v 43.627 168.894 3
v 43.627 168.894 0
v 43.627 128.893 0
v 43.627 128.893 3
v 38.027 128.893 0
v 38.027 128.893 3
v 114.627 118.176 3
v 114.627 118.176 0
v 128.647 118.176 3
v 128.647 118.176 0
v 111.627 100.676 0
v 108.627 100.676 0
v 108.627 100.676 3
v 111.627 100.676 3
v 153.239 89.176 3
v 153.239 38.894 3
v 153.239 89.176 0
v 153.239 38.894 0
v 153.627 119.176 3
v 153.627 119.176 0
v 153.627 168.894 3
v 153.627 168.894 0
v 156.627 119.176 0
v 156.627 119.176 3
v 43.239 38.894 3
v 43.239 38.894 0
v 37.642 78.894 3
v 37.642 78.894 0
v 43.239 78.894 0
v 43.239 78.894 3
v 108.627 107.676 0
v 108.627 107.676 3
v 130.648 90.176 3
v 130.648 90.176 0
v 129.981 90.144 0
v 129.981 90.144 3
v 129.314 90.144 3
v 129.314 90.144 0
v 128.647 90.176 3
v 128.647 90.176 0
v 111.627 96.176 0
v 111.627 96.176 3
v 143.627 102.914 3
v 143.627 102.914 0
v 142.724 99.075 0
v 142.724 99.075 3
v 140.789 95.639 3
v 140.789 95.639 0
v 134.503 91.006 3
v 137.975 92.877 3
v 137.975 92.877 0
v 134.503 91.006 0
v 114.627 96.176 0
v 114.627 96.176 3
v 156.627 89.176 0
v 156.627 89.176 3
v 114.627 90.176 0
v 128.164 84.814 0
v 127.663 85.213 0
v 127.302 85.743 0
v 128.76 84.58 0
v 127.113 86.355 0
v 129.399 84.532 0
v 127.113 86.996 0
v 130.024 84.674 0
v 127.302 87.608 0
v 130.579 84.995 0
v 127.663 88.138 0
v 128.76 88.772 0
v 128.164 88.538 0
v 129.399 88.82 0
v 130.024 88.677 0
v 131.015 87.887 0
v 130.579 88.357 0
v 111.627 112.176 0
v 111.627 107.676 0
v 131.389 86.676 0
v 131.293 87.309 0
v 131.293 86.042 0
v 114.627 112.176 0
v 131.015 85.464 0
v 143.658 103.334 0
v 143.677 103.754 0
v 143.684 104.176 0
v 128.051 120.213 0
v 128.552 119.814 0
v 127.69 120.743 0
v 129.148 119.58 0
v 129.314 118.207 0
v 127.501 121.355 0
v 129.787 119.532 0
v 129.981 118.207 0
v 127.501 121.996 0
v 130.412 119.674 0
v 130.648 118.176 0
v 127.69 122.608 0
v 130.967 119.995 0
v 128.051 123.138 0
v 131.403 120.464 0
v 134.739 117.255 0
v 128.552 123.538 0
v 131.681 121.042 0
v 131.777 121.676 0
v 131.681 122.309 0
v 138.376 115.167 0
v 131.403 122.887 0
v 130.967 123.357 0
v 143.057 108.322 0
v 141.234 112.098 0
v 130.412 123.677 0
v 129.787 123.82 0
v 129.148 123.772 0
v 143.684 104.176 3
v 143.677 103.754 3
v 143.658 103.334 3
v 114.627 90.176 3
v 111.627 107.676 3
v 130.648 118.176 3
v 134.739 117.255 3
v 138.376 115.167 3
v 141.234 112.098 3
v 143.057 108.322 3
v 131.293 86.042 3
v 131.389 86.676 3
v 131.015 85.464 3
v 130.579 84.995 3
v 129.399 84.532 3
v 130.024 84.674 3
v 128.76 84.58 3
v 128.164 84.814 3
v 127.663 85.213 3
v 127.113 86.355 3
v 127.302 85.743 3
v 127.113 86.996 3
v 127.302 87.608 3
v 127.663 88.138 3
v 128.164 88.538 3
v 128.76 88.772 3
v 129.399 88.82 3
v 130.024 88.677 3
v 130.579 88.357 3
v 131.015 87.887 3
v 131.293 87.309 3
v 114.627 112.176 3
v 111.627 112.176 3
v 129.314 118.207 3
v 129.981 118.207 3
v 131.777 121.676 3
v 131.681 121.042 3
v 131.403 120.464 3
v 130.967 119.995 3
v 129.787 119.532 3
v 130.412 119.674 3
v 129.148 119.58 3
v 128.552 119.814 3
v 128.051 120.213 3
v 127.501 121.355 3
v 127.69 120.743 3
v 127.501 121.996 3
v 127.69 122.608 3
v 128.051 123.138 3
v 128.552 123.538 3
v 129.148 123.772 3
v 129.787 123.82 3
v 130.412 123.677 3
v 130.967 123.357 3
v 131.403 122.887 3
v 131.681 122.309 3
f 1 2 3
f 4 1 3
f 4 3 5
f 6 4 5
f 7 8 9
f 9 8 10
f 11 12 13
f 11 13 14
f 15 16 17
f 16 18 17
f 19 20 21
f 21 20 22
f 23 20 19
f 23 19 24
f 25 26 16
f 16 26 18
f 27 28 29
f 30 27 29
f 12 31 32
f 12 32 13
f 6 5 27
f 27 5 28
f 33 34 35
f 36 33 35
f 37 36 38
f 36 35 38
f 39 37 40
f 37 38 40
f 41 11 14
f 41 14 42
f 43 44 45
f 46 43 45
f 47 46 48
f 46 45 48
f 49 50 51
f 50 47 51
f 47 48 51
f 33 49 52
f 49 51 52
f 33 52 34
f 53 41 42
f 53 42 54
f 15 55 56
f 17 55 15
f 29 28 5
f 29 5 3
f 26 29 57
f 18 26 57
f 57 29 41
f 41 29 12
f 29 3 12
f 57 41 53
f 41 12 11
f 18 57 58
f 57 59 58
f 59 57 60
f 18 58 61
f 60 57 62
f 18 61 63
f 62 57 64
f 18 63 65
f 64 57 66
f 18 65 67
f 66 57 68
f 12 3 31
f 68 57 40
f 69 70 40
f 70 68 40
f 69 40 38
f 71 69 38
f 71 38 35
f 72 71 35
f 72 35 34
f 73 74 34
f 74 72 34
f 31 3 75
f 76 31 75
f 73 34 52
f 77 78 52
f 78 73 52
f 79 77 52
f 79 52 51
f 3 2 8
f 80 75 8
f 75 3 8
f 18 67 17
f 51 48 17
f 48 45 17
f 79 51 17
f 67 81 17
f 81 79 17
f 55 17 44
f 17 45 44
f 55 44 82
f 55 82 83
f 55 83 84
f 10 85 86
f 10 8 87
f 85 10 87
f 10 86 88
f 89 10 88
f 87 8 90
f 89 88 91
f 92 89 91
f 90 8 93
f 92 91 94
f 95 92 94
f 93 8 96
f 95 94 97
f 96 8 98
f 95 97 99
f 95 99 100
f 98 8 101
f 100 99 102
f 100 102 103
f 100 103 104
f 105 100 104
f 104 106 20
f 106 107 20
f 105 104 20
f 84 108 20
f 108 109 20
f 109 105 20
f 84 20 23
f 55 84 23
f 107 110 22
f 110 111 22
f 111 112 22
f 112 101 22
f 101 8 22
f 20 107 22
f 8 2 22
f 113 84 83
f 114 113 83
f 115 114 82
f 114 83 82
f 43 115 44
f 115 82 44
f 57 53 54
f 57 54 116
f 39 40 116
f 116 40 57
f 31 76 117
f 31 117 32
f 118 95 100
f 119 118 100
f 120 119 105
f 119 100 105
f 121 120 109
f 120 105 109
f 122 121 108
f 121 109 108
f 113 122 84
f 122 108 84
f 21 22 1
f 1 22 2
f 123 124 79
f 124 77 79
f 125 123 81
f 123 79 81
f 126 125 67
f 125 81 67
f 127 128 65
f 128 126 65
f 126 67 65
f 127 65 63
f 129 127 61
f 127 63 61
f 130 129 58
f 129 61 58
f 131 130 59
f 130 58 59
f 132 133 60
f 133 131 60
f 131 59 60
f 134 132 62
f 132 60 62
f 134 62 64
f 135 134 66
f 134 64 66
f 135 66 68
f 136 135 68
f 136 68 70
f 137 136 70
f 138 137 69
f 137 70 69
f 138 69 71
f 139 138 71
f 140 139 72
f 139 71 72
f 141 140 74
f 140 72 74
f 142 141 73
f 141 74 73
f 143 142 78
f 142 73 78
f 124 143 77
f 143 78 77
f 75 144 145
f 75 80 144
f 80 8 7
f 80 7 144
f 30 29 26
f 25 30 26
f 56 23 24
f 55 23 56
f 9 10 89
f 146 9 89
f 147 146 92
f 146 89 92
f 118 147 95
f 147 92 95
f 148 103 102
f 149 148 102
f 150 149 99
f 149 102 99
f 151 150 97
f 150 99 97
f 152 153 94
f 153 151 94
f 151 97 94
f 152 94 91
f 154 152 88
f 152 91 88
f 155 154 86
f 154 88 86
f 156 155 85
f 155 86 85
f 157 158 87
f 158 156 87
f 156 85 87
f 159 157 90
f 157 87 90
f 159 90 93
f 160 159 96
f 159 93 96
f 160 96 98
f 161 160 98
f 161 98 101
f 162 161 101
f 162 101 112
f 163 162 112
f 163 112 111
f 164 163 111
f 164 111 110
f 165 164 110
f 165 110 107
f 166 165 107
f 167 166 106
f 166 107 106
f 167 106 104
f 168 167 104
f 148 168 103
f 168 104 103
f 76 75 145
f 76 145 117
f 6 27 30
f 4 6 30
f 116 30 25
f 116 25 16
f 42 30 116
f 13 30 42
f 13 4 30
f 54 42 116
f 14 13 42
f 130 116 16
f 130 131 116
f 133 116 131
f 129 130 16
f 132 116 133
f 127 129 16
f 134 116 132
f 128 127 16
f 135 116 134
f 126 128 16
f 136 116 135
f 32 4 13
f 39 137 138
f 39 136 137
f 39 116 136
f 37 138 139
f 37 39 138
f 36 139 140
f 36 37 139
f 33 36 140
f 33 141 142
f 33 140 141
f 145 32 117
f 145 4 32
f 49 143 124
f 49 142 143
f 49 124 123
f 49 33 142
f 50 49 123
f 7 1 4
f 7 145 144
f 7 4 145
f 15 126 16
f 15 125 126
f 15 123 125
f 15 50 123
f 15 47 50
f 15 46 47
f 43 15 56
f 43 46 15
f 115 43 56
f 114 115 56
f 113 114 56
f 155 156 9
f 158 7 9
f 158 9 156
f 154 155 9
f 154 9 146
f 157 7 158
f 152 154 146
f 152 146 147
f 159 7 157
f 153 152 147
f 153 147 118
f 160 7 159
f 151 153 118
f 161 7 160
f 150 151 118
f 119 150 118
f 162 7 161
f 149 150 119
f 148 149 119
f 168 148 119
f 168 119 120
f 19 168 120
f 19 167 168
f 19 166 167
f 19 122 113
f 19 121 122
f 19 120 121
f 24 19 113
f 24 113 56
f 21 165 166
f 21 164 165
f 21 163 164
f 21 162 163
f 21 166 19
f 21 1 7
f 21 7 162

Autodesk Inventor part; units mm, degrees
ref_plane "YZ Plane" through (0, 0, 0) normal (1, 0, 0) x (0, 1, 0)
ref_plane "XZ Plane" through (0, 0, 0) normal (0, 1, 0) x (-1, 0, 0)
ref_plane "XY Plane" through (0, 0, 0) normal (0, 0, 1) x (1, 0, 0)
sketch "Sketch2" plane through (0, 0, 0) normal (0, 0, 1) x (1, 0, 0)
  line L0 (130.6479, 118.1756) -> (130.6479, 90.1756)
  circle A0 centre (129.6479, 104.1756) radius 14.0357
  line L1 (39.8344, 104.1756) -> (88.8344, 104.1756)
  line L2 (130.6479, 90.1756) -> (114.6267, 90.1756)
  line L3 (114.6267, 118.1756) -> (130.6479, 118.1756)
  arc A1 (143.6267, 102.9137) -> (130.6479, 118.1756) centre (129.6479, 104.1756) ccw
  arc A2 (130.6479, 90.1756) -> (143.6267, 102.9137) centre (129.6479, 104.1756) ccw
  line L4 (130.6479, 90.1756) -> (114.6267, 90.1756)
  line L5 (114.6267, 118.1756) -> (130.6479, 118.1756)
  line L6 (153.6267, 168.8936) -> (43.6267, 168.8936)
  line L7 (43.6267, 168.8936) -> (43.6267, 128.8928)
  line L8 (43.6267, 128.8928) -> (38.0267, 128.8928)
  line L9 (38.0267, 128.8928) -> (37.642, 78.8943)
  line L10 (37.642, 78.8943) -> (43.2388, 78.8943)
  line L11 (43.2388, 78.8943) -> (43.2388, 38.8936)
  line L12 (43.2388, 38.8936) -> (153.2388, 38.8936)
  line L13 (153.2388, 38.8936) -> (153.2388, 89.1756)
  line L14 (153.6267, 119.1756) -> (153.6267, 168.8936)
  line L15 (114.6267, 118.1756) -> (114.6267, 112.1756)
  line L16 (114.6267, 112.1756) -> (111.6267, 112.1756)
  line L17 (111.6267, 112.1756) -> (111.6267, 107.6756)
  line L18 (111.6267, 107.6756) -> (108.6267, 107.6756)
  line L19 (108.6267, 107.6756) -> (108.6267, 100.6756)
  line L20 (108.6267, 100.6756) -> (111.6267, 100.6756)
  line L21 (111.6267, 100.6756) -> (111.6267, 96.1756)
  line L22 (111.6267, 96.1756) -> (114.6267, 96.1756)
  line L23 (114.6267, 96.1756) -> (114.6267, 90.1756)
  line L24 (153.6267, 119.1756) -> (156.6267, 119.1756)
  line L25 (156.6267, 119.1756) -> (156.6267, 89.1756)
  line L26 (156.6267, 89.1756) -> (153.2388, 89.1756)
  circle A3 centre (129.2388, 86.6756) radius 2.15
  circle A4 centre (129.6267, 121.6756) radius 2.15
  point P0 (0, 0)
  point P1 (128.6479, 118.1756)
  point P2 (128.6479, 90.1756)
  point P3 (122.6373, 90.1756)
  point P4 (122.6373, 118.1756)
  dimension "d0" = 50
  dimension "d1" = 130
  dimension "d2" = 28.0713
  dimension "d3" = 7
  dimension "d4" = 3
  dimension "d5" = 6
  dimension "d6" = 6
  dimension "d7" = 110
  dimension "d8" = 110
  dimension "d9" = 5.6
  dimension "d10" = 3
  dimension "d11" = 32
  dimension "d13" = 10
  dimension "d14" = 30
  dimension "d15" = 3
  dimension "d18" = 28
  dimension "d28" = 4.3
  dimension "d29" = 24
  dimension "d30" = 3.5
  dimension "d31" = 4.3
  dimension "d32" = 24
  dimension "d33" = 3.5
ref_plane "Work Plane1" through (0, 0, 3) normal (0, 0, 1) x (1, 0, 0)
sketch "Sketch3" plane through (0, 0, 3) normal (0, 0, 1) x (1, 0, 0)
  circle A0 centre (56.2766, 49.819) radius 2.44
  circle A1 centre (70.2268, 49.819) radius 2.475
  circle A2 centre (83.2893, 49.819) radius 2.4
  circle A3 centre (93.7333, 49.819) radius 2.375
  circle A4 centre (104.7615, 49.819) radius 2.35
  circle A5 centre (116.1801, 49.819) radius 2.3
  circle A6 centre (127.2083, 49.819) radius 2.25
  point P0 (0, 0)
  dimension "d19" = 4.88
  dimension "d20" = 4.95
  dimension "d21" = 4.8
  dimension "d24" = 4.75
  dimension "d25" = 4.7
  dimension "d26" = 4.6
  dimension "d27" = 4.5
extrude "Extrusion3" add sketch "Sketch2" along normal blind 3
properties part number "MotorMountPlate"
